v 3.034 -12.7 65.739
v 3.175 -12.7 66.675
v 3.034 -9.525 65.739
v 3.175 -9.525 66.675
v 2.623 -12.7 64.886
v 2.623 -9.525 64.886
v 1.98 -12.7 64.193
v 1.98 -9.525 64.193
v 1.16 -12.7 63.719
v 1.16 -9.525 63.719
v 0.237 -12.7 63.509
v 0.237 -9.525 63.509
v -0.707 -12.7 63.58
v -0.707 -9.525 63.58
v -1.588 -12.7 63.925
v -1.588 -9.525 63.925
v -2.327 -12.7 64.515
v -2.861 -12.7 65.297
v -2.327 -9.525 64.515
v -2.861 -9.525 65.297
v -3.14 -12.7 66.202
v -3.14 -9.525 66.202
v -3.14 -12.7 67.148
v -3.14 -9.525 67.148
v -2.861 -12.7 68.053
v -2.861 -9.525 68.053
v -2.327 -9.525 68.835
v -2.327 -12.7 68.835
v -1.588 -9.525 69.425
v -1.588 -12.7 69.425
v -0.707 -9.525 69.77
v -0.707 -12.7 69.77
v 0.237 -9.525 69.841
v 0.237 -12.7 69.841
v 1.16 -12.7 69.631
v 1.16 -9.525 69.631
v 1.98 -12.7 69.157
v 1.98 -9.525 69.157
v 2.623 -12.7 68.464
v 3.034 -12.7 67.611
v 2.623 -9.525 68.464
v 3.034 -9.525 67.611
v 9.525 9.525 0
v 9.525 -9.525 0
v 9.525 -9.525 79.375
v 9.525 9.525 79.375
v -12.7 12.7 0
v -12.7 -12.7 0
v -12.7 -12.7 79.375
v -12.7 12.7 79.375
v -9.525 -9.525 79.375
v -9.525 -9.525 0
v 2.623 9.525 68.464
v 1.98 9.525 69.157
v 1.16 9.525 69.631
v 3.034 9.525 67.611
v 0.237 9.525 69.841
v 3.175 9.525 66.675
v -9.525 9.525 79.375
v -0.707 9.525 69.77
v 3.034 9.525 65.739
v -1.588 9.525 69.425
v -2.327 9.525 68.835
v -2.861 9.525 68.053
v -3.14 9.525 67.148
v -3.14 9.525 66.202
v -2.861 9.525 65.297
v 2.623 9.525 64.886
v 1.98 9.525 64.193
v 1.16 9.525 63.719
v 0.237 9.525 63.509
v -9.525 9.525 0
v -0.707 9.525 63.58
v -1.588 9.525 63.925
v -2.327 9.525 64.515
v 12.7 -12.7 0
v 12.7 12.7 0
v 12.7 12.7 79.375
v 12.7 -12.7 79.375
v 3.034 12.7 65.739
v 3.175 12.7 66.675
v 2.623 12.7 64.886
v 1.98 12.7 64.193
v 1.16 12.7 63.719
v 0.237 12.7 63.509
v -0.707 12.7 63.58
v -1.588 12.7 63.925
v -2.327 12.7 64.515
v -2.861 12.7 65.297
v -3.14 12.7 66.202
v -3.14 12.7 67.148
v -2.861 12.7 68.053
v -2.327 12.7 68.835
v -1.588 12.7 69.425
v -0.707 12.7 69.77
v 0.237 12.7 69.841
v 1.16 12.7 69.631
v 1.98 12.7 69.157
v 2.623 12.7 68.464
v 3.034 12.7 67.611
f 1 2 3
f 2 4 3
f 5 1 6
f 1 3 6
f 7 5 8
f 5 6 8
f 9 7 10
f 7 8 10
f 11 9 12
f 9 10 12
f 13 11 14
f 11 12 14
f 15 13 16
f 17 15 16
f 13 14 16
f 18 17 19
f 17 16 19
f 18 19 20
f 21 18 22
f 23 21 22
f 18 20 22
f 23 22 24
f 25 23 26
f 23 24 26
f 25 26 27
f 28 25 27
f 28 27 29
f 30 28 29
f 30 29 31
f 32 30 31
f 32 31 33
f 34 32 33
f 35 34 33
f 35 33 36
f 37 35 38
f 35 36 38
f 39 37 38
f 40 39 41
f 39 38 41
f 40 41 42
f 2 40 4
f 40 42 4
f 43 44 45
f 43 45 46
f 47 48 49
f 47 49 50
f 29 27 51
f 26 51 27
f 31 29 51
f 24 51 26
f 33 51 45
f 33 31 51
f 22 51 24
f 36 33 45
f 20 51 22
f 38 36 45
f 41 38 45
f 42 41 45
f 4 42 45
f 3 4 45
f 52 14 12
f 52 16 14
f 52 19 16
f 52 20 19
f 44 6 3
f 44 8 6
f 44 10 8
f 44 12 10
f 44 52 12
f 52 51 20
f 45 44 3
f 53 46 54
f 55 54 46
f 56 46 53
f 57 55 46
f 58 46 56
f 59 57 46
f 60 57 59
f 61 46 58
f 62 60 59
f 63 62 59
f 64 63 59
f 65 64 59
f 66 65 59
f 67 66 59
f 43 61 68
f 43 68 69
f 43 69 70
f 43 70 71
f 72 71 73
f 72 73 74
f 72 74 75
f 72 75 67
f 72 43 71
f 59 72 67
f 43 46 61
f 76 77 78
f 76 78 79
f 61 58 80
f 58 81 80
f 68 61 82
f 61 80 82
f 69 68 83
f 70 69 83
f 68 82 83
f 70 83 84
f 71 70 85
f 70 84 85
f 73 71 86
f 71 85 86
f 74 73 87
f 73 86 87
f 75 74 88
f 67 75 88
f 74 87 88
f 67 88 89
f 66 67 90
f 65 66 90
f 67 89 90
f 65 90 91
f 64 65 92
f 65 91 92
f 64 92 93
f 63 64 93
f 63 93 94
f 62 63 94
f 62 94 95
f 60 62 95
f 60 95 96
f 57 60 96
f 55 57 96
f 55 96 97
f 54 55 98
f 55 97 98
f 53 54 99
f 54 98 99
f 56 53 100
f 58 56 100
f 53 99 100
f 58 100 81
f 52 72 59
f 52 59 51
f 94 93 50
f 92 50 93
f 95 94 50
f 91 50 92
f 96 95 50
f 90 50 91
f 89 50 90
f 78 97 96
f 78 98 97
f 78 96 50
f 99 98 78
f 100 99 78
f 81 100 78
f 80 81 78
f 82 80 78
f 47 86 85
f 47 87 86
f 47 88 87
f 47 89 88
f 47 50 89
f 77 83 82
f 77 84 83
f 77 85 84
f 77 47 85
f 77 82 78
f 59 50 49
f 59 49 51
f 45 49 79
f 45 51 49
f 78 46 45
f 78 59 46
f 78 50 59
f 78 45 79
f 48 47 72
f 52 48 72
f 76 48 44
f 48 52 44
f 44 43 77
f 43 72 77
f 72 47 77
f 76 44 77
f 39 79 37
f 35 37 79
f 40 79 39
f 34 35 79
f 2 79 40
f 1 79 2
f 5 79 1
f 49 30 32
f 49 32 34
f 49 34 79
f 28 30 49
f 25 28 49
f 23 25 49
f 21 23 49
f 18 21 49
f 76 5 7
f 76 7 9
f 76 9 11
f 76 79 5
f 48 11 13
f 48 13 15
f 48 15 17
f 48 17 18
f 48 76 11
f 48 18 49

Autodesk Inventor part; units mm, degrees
ref_plane "YZ Plane" through (0, 0, 0) normal (1, 0, 0) x (0, 1, 0)
ref_plane "XZ Plane" through (0, 0, 0) normal (0, 1, 0) x (-1, 0, 0)
ref_plane "XY Plane" through (0, 0, 0) normal (0, 0, 1) x (1, 0, 0)
sketch "Sketch1" plane through (0, 0, 0) normal (0, 0, 1) x (1, 0, 0)
  line L0 (-12.7, 12.7) -> (12.7, 12.7)
  line L1 (12.7, 12.7) -> (12.7, -12.7)
  line L2 (12.7, -12.7) -> (-12.7, -12.7)
  line L3 (-12.7, -12.7) -> (-12.7, 12.7)
  line L4 (-9.525, -9.525) -> (9.525, -9.525)
  line L5 (9.525, -9.525) -> (9.525, 9.525)
  line L6 (9.525, 9.525) -> (-9.525, 9.525)
  line L7 (-9.525, 9.525) -> (-9.525, -9.525)
  point P0 (0, 0)
  dimension "d0" = 25.4
  dimension "d1" = 25.4
  dimension "d2" = 12.7
  dimension "d3" = 12.7
  dimension "d4" = 3.175
  dimension "d5" = 3.175
  dimension "d6" = 3.175
  dimension "d7" = 3.175
extrude "Extrusion1" add sketch "Sketch1" along normal blind 79.375
sketch "Sketch3" plane through (-12.7, 12.7, 0) normal (0, 1, 0) x (1, 0, 0)
  line L0 (25.4, 0) -> (25.4, -79.375) projected
  line L1 (0, 0) -> (25.4, 0) projected
  circle A0 centre (12.7, -66.675) radius 3.175
  point P0 (25.4, -158.75)
  point P1 (12.7, 0)
  dimension "d13" = 66.675
  dimension "d14" = 12.7
  dimension "d15" = 6.35
extrude "Extrusion3" cut sketch "Sketch3" against normal blind 25.4
properties part number "edge frame short"
